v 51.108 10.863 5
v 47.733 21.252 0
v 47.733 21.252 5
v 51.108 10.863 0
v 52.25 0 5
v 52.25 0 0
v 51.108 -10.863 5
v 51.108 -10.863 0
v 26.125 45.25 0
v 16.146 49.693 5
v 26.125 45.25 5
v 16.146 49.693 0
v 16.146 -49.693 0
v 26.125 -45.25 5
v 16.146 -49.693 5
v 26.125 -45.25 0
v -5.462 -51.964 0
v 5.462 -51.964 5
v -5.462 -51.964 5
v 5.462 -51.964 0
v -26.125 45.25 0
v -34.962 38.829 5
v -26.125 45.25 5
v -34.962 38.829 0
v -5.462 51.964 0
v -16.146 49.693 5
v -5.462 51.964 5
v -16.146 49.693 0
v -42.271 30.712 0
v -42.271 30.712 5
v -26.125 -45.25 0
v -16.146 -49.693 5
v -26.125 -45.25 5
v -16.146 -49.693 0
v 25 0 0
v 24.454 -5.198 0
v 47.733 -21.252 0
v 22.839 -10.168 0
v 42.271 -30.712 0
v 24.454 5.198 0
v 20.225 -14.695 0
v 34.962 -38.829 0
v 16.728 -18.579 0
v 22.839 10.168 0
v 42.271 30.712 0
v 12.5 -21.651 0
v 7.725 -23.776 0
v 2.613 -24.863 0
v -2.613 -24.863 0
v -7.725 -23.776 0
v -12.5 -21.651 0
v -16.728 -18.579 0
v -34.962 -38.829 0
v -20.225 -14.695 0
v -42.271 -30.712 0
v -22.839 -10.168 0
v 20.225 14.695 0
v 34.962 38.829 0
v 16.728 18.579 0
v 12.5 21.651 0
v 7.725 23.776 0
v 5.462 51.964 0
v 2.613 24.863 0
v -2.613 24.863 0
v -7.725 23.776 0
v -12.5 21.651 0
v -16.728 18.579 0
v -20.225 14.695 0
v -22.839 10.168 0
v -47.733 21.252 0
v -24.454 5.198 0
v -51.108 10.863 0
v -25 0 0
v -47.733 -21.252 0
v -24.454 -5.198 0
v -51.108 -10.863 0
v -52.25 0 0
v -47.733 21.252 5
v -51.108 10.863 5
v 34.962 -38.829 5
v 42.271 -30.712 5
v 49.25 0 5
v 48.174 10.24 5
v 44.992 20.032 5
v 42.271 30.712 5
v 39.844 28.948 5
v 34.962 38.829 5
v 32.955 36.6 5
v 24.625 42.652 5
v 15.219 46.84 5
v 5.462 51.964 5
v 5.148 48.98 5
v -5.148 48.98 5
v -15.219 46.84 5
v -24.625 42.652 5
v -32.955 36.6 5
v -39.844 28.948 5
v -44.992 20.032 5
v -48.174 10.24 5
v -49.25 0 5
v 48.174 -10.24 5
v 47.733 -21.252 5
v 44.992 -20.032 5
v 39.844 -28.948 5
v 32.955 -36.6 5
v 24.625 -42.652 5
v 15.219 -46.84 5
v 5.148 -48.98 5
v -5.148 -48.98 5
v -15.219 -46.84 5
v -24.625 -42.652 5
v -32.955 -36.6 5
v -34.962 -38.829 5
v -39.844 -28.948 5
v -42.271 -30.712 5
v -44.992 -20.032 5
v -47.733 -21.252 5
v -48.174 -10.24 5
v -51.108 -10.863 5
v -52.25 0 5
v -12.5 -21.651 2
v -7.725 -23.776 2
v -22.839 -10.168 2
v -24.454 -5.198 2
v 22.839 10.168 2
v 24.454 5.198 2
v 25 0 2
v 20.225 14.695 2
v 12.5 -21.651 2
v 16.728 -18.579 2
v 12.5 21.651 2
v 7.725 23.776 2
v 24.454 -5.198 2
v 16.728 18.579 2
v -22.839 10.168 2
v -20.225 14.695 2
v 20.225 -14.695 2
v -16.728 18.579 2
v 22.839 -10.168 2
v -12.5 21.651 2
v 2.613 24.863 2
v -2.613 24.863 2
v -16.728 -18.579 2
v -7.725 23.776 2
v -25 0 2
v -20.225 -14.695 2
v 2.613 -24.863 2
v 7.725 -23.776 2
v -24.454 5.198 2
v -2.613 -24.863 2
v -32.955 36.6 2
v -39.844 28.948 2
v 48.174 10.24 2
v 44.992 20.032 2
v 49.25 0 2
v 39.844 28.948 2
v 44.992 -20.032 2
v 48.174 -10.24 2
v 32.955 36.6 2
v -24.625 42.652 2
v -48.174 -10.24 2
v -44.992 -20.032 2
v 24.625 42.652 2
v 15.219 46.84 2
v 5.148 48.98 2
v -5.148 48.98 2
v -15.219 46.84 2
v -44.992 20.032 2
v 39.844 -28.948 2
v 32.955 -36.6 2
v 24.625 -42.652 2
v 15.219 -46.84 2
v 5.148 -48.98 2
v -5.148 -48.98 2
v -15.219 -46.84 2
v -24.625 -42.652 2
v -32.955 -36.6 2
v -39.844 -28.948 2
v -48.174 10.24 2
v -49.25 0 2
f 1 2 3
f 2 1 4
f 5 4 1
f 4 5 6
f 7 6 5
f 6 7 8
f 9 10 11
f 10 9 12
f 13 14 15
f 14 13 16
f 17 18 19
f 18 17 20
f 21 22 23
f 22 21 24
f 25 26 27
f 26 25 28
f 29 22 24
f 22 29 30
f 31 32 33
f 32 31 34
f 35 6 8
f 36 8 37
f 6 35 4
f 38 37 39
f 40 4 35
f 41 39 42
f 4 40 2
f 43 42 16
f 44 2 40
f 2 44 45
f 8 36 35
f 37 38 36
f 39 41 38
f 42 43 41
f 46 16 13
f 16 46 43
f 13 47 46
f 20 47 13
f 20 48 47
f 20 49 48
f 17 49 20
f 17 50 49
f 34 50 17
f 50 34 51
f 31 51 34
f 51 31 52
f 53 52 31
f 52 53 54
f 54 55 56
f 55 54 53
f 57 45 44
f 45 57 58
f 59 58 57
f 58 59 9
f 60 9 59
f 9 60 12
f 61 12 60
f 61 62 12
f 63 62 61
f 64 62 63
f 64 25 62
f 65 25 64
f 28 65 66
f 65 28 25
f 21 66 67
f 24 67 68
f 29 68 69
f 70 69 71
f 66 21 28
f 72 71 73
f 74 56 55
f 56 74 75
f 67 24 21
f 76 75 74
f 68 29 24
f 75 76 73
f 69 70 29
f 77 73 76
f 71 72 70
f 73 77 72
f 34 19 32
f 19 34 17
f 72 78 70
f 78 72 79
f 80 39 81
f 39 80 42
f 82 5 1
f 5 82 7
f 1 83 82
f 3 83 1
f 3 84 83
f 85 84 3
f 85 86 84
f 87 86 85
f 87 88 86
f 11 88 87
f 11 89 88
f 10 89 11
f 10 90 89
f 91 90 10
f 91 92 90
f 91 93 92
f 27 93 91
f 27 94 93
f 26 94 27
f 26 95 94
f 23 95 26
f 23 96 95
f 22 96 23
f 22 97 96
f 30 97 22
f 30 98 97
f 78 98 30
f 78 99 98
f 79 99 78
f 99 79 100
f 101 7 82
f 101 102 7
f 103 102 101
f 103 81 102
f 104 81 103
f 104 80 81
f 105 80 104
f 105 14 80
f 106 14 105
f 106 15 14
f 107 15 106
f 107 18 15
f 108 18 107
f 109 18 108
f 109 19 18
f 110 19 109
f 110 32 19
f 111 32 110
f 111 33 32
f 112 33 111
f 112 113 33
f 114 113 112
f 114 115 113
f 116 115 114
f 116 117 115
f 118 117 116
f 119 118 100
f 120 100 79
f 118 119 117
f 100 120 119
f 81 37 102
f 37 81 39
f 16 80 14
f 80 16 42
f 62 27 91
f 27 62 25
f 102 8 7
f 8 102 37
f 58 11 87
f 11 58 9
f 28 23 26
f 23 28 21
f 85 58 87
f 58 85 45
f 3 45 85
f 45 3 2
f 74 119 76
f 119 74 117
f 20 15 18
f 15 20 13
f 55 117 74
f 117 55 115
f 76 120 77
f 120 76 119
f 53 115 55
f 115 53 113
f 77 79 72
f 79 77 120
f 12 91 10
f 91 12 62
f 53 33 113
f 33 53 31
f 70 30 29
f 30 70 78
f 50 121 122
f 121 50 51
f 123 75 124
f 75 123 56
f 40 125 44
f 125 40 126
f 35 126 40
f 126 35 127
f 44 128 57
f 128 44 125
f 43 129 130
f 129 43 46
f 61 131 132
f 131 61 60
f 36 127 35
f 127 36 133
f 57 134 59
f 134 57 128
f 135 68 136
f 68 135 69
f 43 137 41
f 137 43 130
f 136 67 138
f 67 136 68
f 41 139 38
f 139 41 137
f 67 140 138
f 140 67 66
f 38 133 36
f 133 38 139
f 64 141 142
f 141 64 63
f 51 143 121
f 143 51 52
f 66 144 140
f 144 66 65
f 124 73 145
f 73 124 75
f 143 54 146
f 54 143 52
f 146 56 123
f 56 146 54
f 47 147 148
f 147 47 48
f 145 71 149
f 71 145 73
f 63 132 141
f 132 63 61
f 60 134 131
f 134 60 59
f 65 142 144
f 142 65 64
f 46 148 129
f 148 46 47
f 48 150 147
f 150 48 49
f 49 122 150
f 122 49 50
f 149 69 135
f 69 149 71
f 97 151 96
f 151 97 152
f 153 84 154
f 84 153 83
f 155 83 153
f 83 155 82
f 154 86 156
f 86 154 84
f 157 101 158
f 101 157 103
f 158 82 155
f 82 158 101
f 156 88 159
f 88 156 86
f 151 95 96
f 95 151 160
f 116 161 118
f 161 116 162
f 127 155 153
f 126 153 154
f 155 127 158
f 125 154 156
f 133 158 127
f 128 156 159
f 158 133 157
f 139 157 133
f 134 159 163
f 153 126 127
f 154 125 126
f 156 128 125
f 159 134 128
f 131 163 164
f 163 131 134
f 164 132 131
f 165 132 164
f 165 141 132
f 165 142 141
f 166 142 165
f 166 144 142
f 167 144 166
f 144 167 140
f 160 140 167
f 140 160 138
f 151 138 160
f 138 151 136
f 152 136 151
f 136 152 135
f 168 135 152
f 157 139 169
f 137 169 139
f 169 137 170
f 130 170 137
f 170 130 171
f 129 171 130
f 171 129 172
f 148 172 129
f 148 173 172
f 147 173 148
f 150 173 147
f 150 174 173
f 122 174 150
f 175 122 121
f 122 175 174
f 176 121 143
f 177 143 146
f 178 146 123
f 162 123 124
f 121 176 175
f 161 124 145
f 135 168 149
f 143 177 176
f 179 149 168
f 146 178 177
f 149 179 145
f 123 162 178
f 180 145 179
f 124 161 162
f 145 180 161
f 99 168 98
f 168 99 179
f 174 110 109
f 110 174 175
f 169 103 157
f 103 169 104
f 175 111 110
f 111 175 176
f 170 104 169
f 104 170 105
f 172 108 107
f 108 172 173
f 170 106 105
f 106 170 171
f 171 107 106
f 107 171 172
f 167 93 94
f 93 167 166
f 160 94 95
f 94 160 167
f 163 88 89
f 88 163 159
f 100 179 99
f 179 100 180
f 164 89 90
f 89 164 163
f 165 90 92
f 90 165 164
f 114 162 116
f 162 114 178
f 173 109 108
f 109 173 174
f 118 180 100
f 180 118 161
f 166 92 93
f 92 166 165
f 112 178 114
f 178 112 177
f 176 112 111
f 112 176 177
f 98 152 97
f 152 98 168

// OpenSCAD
// Parametric Solar filter frame for Baader's Astrosolar film.
// Author: Fabrice Fleurot

// DISCLAIMER: solar observation contains a real element of risk if the filter is not correctly built or fitted.
// I obviously take no responsibility: The frame I designed works for me and it's all I can say.
// If you take the risk and responsibility to print it for yourself, you're on your own! So:
// 1- read carefully Baader's instructions.
// 2- make sure the film is properly glued or taped.
// 3- make sure that the filter is fitted securely on the scope. It should not be loose.
// 4- Don't elbow it, tell the "funny" ones among your friends to not take it off as a prank, keep children, teenagers and as a general rule anyone under 30 away, use common sense. Accidents can and do happen.
// 5- double check every time you use it that the whole structure is sound, that the glue/tape is still strong and that there are not gaps or hole.
// 5a- double check again.
// 6- good luck.

// The file contains four objects: The main tube (black in photo), the front ring (white) and two caps.
// Choose which object to print below and modify the parameters to fit your telescope or finder.

// object = "tube";
object = "front ring";
// object = "small cap";
// object = "large cap";

R = 57.5/2;  // Scope external radius.
r = 50/2; // Half the scope aperture.
H = 30;   // Frame height.
lip = 20; // "lip" size around the tube.

th = 3;   // Thickness of the frame.
ribWidth = 1;   // Size of the "ribs" inside the tube.
glueGap=0.5;   // Gap between the main body and and the front ring, it needs enough for glue.
gap=0.1;     // Gap between Scope and frame.
thw = 2;     // Thickness of each of the two parts of the lip.
tapeTh = 1;   // Thickness of double-sided tape. I used 0 with glue, it was good enough.


// Epsilon for subtraction operation, no need to change:
e = 1;


if(object == "tube")
{
    //Main tube (black in photo):
    translate([0,0,thw])
        difference()  // Lip
        {
            cylinder(r=R+lip, h=thw);
            translate([0,0,-e])
                cylinder(r=r, h=thw+2*e);
        }
    translate([0,0,2*thw])
        union()
        {
            difference()
            {
                cylinder(r=R+gap+ribWidth+th, h=H);
                translate([0,0,-e])
                    cylinder(r=R+gap+ribWidth, h=H+2*e);
            }
            translate([R+gap,-ribWidth/2,0]) cube([ribWidth+e, ribWidth, H]);
            rotate([0,0,90])
                translate([R+gap,-ribWidth/2,0]) cube([ribWidth+e, ribWidth, H]);
            rotate([0,0,180])
                translate([R+gap,-ribWidth/2,0]) cube([ribWidth+e, ribWidth, H]);
            rotate([0,0,270])
                translate([R+gap,-ribWidth/2,0]) cube([ribWidth+e, ribWidth, H]);
    }
}

if(object == "front ring")
{
    difference()
    {
        cylinder(r=R+lip+th+glueGap, h=2*thw+tapeTh);
        translate([0,0,-e])
            cylinder(r=r, h=thw+2*e);
        translate([0,0,thw])
            cylinder(r=R+lip+glueGap, h=thw+tapeTh+e);
    }
}


// Large cap
if(object == "large cap")
{
    $fn=50;
    RC = R+lip+th+glueGap+ribWidth;
    translate([0,0,-thw])
    union()
    {
        difference()
        {
            cylinder(r=RC+thw, h=3*thw);
            translate([0,0,thw])
                cylinder(r=RC, h=2*thw+e);
        }
        translate([RC-ribWidth,-ribWidth/2,thw]) cube([ribWidth+e, ribWidth, 2*thw]);
        rotate([0,0,90])
            translate([RC-ribWidth,-ribWidth/2,thw]) cube([ribWidth+e, ribWidth, 2*thw]);
        rotate([0,0,180])
            translate([RC-ribWidth,-ribWidth/2,thw]) cube([ribWidth+e, ribWidth, 2*thw]);
        rotate([0,0,270])
            translate([RC-ribWidth,-ribWidth/2,thw]) cube([ribWidth+e, ribWidth, 2*thw]);
    }
}


Rc = R+gap+ribWidth+th;
if(object == "small cap")
{
    //translate([0,0,H+3*thw]) rotate([180,0,0])
    union()
    {
        difference()
        {
            cylinder(r=Rc+ribWidth+thw, h=3*thw);
            translate([0,0,thw])
                cylinder(r=Rc+ribWidth, h=2*thw+e);
        }
        translate([Rc,-ribWidth/2,thw]) cube([ribWidth+e, ribWidth, 2*thw]);
        rotate([0,0,90])
            translate([Rc,-ribWidth/2,thw]) cube([ribWidth+e, ribWidth, 2*thw]);
        rotate([0,0,180])
            translate([Rc,-ribWidth/2,thw]) cube([ribWidth+e, ribWidth, 2*thw]);
        rotate([0,0,270])
            translate([Rc,-ribWidth/2,thw]) cube([ribWidth+e, ribWidth, 2*thw]);
    }
}
